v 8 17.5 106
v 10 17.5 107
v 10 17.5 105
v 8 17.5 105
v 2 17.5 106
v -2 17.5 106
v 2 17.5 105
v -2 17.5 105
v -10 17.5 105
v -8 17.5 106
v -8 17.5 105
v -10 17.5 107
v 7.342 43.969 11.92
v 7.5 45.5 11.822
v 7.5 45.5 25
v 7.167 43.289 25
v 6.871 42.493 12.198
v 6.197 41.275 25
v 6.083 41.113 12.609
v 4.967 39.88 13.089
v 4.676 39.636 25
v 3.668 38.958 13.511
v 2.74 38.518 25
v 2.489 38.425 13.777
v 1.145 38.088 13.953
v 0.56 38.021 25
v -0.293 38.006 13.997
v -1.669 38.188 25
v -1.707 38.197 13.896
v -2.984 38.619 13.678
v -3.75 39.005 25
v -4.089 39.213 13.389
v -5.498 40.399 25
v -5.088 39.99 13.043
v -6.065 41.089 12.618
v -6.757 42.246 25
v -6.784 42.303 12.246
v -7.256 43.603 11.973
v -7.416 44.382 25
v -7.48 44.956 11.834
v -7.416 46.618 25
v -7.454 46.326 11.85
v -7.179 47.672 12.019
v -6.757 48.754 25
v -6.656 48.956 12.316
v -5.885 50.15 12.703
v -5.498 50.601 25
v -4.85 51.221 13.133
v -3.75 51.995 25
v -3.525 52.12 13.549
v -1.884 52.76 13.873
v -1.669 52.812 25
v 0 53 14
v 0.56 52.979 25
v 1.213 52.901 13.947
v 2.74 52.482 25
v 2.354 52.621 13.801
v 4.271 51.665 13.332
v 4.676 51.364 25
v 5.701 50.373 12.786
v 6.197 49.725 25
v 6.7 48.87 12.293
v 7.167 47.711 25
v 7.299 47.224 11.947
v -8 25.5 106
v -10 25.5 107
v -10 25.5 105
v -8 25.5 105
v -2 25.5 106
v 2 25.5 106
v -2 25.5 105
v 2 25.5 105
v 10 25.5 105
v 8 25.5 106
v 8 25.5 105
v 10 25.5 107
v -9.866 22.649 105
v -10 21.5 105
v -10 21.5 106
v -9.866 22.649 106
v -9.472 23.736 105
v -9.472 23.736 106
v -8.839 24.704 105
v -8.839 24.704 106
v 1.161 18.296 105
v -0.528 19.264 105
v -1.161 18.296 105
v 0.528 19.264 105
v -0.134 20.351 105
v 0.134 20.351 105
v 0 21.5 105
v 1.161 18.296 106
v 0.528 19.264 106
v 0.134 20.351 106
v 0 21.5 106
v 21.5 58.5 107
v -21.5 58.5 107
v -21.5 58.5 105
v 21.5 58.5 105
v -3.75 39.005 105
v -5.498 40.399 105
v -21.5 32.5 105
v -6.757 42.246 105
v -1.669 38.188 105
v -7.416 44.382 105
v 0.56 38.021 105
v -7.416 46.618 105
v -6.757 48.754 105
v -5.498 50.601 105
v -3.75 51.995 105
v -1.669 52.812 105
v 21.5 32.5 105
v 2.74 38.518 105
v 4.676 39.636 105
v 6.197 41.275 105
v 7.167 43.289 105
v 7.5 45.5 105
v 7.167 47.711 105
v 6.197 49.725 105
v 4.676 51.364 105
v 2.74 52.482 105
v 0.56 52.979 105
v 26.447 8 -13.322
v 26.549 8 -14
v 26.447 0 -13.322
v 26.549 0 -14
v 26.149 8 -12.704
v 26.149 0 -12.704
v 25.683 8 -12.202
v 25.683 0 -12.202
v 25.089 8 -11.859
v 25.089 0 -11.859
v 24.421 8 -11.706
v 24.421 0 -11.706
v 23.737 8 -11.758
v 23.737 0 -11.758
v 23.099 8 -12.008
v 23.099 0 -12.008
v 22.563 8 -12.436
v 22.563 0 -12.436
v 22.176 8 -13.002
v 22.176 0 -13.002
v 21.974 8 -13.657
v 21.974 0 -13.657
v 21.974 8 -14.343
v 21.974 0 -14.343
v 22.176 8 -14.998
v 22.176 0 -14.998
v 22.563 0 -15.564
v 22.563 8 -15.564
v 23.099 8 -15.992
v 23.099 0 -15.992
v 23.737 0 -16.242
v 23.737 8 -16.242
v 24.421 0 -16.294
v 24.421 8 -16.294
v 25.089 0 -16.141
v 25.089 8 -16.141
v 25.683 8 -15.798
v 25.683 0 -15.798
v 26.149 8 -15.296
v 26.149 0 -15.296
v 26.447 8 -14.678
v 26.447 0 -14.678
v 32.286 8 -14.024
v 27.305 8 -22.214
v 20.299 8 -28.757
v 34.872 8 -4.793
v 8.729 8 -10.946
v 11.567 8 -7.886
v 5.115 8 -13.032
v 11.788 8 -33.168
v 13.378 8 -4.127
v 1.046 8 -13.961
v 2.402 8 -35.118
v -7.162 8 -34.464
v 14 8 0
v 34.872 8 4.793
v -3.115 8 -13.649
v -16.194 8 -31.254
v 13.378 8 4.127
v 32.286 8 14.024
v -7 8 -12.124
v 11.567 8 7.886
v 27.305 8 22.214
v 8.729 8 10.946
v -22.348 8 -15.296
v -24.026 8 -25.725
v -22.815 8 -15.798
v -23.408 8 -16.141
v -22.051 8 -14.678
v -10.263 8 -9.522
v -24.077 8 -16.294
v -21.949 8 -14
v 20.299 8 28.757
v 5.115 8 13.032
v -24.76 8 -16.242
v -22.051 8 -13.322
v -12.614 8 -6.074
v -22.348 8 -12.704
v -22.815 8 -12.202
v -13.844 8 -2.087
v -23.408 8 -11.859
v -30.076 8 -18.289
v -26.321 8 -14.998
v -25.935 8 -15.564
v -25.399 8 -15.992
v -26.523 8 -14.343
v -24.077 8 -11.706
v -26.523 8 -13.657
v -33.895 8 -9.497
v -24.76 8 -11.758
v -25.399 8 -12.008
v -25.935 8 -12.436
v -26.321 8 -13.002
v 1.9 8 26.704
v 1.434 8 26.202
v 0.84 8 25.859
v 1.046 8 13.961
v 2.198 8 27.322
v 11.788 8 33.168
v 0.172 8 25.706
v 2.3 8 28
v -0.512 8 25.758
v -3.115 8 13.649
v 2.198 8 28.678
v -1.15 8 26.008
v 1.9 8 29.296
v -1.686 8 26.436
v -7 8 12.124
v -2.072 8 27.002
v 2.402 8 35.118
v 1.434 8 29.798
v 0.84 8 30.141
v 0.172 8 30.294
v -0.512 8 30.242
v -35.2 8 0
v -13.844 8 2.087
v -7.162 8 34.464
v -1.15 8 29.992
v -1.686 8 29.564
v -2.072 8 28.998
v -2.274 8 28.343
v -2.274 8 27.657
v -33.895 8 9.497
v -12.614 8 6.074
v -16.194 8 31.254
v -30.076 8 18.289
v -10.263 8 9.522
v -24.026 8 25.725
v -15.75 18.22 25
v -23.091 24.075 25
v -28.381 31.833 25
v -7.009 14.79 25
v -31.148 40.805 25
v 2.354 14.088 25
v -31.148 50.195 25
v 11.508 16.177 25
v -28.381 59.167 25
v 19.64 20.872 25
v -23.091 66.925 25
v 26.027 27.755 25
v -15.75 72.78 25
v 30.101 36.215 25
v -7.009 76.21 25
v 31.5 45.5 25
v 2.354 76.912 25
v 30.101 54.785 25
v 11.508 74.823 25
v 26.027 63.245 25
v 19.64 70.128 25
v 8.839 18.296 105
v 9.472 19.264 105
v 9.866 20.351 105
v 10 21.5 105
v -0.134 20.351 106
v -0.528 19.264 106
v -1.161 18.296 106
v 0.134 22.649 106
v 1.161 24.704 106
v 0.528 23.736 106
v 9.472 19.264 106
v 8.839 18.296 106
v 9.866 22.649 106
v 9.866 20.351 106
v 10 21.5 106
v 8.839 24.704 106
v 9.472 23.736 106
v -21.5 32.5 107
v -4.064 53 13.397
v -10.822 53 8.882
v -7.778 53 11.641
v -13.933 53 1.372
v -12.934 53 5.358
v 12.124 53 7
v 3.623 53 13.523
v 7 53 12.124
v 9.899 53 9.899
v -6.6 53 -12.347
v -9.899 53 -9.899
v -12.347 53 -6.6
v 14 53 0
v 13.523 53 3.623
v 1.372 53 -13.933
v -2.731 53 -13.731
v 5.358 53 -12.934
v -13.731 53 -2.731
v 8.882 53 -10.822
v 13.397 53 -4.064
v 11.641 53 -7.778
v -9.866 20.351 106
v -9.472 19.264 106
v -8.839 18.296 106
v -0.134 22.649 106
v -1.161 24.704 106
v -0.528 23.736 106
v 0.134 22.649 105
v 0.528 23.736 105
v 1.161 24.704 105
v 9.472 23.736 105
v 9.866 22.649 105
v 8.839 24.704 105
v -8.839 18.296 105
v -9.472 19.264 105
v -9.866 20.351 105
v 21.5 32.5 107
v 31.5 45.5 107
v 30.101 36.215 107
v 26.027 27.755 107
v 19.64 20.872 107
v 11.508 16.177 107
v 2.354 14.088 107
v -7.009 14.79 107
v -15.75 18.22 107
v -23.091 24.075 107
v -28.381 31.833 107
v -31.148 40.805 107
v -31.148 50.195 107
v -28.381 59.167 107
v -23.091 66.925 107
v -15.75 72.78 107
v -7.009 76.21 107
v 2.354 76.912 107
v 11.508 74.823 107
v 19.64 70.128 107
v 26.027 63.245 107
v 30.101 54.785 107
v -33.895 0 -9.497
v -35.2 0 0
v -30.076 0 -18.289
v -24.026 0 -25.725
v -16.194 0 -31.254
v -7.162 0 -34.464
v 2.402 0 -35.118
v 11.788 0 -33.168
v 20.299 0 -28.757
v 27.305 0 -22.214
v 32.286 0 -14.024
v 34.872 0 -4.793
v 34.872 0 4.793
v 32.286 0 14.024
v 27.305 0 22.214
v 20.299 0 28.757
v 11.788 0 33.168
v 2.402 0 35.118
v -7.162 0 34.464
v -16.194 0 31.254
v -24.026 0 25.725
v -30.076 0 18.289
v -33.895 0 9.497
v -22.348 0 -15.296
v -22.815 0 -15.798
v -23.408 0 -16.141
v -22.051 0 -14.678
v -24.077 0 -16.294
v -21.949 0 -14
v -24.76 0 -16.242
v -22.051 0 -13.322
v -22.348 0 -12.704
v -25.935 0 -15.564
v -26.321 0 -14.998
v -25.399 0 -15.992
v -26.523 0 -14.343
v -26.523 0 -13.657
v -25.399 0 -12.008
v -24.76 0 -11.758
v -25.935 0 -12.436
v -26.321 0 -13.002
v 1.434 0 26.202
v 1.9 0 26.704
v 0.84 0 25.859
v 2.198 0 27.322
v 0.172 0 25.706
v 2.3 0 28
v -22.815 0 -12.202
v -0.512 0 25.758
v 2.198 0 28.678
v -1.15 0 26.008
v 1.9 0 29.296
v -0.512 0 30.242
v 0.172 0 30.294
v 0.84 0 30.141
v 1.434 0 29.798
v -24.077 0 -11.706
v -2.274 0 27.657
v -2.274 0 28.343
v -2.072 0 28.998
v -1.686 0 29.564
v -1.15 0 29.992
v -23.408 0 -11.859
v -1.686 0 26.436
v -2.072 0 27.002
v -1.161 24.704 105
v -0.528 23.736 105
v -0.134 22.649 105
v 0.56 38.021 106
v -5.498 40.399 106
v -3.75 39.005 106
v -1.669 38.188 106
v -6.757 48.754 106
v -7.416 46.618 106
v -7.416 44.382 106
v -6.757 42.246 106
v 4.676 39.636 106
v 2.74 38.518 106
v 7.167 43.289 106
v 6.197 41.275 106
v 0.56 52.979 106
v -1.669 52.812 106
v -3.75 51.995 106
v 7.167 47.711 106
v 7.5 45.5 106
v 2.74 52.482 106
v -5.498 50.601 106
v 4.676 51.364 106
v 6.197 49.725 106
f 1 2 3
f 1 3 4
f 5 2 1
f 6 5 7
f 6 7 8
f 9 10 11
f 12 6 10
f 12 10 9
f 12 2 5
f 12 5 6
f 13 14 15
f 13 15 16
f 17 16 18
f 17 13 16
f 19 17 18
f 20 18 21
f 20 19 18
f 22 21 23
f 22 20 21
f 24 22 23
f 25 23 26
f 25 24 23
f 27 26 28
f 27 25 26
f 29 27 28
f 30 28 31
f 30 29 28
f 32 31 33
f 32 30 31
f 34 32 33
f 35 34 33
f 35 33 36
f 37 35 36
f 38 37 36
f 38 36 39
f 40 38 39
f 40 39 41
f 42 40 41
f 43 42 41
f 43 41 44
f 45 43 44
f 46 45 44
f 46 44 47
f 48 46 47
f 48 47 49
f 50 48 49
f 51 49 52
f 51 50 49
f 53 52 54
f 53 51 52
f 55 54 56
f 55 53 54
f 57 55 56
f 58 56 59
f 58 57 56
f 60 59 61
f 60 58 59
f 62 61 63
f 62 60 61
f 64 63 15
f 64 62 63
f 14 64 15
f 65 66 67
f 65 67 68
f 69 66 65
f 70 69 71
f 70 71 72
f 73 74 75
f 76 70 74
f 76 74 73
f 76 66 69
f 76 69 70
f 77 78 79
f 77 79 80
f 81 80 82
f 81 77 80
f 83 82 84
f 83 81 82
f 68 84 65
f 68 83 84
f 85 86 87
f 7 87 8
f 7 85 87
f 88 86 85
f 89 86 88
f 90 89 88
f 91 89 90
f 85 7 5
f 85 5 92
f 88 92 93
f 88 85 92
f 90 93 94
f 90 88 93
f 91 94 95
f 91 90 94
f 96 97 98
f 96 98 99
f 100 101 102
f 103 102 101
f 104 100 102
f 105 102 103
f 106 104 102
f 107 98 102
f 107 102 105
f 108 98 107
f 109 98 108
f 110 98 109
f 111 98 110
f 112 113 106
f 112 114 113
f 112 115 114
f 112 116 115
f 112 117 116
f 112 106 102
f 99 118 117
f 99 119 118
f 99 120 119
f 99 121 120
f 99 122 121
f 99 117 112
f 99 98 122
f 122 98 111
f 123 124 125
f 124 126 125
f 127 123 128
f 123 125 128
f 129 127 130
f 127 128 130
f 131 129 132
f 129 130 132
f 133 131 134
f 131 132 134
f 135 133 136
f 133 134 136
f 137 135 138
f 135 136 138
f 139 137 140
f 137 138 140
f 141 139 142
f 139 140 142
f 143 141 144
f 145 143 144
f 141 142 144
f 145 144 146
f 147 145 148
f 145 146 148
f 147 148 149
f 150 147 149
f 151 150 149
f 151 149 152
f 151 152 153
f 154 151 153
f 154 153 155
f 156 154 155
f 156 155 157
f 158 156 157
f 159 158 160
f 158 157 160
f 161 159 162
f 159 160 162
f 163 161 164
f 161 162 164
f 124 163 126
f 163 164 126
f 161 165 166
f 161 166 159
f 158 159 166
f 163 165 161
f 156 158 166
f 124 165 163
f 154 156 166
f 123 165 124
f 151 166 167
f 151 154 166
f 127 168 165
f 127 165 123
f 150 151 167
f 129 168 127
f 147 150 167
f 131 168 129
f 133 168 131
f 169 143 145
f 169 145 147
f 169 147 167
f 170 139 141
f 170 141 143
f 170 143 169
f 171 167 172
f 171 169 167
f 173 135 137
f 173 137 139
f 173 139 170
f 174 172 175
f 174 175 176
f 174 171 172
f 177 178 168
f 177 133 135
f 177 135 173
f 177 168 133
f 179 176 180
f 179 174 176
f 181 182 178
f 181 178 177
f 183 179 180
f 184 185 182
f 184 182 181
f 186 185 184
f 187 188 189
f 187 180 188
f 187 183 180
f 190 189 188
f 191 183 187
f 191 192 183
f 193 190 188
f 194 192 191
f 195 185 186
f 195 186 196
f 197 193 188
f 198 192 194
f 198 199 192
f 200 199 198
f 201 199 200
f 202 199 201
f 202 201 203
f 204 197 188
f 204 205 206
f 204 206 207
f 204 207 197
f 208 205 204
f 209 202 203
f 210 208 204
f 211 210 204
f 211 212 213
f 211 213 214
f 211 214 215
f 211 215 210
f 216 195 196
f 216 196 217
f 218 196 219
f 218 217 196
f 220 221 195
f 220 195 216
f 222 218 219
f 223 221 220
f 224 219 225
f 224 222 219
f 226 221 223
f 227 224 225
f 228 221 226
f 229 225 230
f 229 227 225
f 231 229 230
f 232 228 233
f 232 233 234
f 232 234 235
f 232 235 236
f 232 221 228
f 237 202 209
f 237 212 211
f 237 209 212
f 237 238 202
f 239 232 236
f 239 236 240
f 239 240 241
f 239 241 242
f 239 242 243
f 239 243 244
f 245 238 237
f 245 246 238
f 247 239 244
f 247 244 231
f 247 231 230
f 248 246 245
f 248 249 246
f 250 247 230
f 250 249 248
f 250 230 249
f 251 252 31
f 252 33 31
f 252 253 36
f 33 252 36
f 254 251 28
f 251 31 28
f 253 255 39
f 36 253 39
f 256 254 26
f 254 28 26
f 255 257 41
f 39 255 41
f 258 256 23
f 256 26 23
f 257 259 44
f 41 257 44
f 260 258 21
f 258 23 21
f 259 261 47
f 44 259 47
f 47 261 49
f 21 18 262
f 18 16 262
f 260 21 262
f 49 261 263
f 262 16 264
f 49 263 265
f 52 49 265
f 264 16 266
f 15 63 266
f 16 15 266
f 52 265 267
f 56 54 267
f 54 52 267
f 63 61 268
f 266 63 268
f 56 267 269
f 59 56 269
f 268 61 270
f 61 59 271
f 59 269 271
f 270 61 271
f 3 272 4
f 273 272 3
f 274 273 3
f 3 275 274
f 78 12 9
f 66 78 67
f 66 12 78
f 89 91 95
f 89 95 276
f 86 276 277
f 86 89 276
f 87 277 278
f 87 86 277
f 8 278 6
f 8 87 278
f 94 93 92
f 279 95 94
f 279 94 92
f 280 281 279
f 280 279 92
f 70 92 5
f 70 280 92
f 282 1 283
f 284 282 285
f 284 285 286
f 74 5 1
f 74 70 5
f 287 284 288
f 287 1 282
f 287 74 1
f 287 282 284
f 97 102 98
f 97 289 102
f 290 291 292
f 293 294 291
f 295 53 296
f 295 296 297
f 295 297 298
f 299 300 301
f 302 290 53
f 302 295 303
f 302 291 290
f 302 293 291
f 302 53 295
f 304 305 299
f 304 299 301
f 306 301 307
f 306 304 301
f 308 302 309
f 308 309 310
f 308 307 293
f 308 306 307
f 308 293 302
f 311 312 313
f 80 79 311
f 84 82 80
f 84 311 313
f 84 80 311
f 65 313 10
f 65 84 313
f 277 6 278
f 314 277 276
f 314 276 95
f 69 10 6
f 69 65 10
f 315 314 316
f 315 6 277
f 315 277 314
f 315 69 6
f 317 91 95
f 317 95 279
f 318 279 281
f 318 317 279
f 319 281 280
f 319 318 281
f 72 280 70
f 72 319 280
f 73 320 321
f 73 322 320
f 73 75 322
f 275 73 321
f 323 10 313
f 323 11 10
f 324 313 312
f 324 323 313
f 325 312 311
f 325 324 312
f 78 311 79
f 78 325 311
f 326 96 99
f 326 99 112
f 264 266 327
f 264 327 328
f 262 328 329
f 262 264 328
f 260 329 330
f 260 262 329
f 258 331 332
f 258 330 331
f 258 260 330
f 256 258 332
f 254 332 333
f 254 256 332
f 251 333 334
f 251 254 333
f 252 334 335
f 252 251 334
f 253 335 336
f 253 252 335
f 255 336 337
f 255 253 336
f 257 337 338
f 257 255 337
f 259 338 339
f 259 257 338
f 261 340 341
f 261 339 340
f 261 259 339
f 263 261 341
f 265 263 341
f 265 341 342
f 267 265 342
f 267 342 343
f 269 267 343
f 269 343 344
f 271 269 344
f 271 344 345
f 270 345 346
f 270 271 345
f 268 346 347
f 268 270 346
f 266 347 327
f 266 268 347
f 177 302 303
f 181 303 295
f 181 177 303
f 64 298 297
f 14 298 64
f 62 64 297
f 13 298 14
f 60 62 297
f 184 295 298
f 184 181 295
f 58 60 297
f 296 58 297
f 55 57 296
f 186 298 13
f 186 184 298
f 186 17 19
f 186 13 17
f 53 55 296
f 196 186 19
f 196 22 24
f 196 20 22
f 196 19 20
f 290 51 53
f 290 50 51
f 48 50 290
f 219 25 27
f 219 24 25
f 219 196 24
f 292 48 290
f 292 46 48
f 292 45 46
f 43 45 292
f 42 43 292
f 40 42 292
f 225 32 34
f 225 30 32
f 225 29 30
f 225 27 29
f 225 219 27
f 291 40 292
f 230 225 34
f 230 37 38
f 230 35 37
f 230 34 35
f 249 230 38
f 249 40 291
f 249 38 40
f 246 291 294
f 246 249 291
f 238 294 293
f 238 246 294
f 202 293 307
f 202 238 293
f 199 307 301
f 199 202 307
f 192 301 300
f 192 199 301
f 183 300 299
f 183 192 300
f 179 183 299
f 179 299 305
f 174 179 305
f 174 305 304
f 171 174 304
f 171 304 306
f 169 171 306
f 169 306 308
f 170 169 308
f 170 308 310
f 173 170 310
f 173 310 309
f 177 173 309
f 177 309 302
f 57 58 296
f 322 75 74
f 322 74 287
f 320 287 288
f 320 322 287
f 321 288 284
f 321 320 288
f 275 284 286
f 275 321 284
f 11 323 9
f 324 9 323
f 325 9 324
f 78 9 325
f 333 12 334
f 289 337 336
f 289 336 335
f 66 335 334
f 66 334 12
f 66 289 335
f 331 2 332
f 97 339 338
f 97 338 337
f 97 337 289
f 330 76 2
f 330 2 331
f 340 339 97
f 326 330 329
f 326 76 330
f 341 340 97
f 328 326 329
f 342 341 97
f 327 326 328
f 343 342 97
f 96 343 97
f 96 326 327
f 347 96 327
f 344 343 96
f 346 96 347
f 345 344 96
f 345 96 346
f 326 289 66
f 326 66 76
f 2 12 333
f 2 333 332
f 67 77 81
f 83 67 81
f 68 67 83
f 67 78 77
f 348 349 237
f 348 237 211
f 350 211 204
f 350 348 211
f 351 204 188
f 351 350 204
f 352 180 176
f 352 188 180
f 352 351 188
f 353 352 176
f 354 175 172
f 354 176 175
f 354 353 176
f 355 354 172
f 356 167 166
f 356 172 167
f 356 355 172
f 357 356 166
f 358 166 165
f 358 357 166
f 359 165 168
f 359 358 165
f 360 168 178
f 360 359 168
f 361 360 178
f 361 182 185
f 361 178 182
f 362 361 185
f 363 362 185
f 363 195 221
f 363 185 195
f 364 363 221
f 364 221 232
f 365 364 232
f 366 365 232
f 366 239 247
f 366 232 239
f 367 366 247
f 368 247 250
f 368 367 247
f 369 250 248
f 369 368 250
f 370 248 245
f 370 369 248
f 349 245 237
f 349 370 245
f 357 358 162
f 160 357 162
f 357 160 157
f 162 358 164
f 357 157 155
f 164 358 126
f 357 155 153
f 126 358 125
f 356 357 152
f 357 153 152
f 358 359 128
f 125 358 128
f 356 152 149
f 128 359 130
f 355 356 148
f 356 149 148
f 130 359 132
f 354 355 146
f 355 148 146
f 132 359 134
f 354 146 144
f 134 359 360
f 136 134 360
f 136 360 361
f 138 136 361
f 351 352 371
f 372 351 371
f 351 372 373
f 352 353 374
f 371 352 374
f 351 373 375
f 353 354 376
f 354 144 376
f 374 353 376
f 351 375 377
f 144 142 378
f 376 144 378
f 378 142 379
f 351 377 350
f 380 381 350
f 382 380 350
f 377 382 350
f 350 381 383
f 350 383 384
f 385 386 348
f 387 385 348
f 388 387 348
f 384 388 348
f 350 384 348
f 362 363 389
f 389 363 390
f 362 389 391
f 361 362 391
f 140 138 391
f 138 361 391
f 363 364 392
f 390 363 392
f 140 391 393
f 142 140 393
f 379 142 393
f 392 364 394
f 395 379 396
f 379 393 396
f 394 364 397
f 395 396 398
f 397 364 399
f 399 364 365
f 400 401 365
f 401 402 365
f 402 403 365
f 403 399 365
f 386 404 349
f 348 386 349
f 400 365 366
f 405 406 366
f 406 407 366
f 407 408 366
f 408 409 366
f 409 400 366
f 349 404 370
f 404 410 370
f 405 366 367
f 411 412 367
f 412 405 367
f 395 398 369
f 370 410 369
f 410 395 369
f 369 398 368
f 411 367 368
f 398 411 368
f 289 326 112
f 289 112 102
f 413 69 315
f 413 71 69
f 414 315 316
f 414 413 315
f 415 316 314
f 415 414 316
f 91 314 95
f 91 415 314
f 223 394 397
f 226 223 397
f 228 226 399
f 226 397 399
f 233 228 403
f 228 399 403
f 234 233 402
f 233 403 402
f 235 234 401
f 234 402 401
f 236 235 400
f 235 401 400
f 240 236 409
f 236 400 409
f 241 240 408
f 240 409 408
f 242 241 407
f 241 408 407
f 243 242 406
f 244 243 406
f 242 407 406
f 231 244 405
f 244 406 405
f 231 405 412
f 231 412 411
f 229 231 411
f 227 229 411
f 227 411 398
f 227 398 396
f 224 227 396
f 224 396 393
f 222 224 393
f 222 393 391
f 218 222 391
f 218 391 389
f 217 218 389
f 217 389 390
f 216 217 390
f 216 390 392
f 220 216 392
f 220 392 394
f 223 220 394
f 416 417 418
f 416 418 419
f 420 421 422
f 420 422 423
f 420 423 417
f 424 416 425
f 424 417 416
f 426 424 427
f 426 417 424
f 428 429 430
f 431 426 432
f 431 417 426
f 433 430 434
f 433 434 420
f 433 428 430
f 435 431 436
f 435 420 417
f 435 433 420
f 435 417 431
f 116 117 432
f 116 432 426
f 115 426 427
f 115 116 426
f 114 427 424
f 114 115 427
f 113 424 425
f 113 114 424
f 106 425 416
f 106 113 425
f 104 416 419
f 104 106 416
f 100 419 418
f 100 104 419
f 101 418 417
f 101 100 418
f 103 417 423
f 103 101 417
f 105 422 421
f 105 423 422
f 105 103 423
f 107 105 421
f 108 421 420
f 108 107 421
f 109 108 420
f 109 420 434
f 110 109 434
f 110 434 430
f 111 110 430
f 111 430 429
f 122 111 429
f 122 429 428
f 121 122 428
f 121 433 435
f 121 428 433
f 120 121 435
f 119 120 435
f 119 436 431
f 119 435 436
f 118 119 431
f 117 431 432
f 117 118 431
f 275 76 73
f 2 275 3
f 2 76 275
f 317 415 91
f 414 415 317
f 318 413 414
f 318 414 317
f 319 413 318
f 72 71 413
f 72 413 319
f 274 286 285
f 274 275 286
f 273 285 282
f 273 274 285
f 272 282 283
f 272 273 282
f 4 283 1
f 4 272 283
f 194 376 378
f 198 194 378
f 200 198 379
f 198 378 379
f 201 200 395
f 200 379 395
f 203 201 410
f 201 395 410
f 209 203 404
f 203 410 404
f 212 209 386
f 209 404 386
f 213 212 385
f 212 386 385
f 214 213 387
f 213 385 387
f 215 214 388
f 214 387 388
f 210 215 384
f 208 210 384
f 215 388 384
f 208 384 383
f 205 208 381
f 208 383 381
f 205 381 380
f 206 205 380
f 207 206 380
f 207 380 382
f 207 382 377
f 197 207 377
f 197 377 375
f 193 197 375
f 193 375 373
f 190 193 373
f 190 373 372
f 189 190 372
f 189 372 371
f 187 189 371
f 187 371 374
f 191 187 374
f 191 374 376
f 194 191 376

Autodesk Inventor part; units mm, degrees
ref_plane "YZ Plane" through (0, 0, 0) normal (1, 0, 0) x (0, 1, 0)
ref_plane "XZ Plane" through (0, 0, 0) normal (0, 1, 0) x (-1, 0, 0)
ref_plane "XY Plane" through (0, 0, 0) normal (0, 0, 1) x (1, 0, 0)
sketch "Sketch1" plane through (0, 0, 0) normal (0, 1, 0) x (-1, 0, 0)
  circle A0 centre (0, 0) radius 35.2
  dimension "d0" = 70.4
extrude "Extrusion1" add sketch "Sketch1" along normal blind 8
sketch "Sketch2" plane through (0, 8, 0) normal (0, 1, 0) x (1, 0, 0)
  circle A0 centre (0, 0) radius 14
  dimension "d3" = 28
extrude "Extrusion2" add sketch "Sketch2" along normal blind 45
sketch "Sketch3" plane through (0, 0, 0) normal (0, 0, 1) x (1, 0, 0)
  circle A0 centre (0, 45.5) radius 7.5
  point P0 (0, 0)
extrude "Extrusion3" add sketch "Sketch3" along normal blind 25
sketch "Sketch4" plane through (0, 45.5, 25) normal (0, 0, 1) x (1, 0, 0)
  circle A0 centre (0, 0) radius 31.5
  point P0 (0, -45.5)
  dimension "d8" = 63
extrude "Extrusion4" add sketch "Sketch4" along normal blind 82
sketch "Sketch5" plane through (0, 45.5, 107) normal (0, 0, 1) x (1, 0, 0)
  line L0 (-21.5, 13) -> (21.5, 13)
  line L1 (21.5, 13) -> (21.5, -13)
  line L2 (21.5, -13) -> (-21.5, -13)
  line L3 (-21.5, -13) -> (-21.5, 13)
  line L4 (-21.5, 13) -> (21.5, -13) construction
  line L5 (21.5, 13) -> (-21.5, -13) construction
  line L6 (-10, -20) -> (10, -20)
  line L7 (10, -20) -> (10, -28)
  line L8 (10, -28) -> (-10, -28)
  line L9 (-10, -28) -> (-10, -20)
  line L10 (-10, -20) -> (10, -28) construction
  line L11 (10, -20) -> (-10, -28) construction
  point P0 (0, -45.5)
  point P1 (0, 0)
  point P2 (0, -24)
  dimension "d11" = 43
  dimension "d12" = 26
  dimension "d13" = 20
  dimension "d14" = 8
extrude "Extrusion5" cut sketch "Sketch5" against normal blind 2
sketch "Sketch6" plane through (0, 45.5, 105) normal (0, 0, 1) x (1, 0, 0)
  circle A0 centre (0, 0) radius 7.5
  circle A1 centre (-5, -24) radius 5
  circle A2 centre (5, -24) radius 5
  point P0 (0, -45.5)
  point P1 (0, -24)
  dimension "d17" = 15
  dimension "d18" = 10
  dimension "d19" = 10
extrude "Extrusion6" add sketch "Sketch6" along normal blind 1
sketch "Sketch8" plane through (0, 0, 0) normal (0, -1, 0) x (1, 0, 0)
  circle A0 centre (0, 0) radius 28 construction
  line L0 (0, 0) -> (50, 0) construction
  line L1 (0, 0) -> (-43.3013, -25) construction
  line L2 (0, 0) -> (50, 0) construction
  line L3 (0, 0) -> (0, 50)
  line L4 (0, 0) -> (50, 0) construction
  circle A1 centre (0, 28) radius 2.3
  circle A2 centre (-24.2487, -14) radius 2.3
  line L5 (0, 0) -> (43.3013, -25) construction
  line L6 (0, 0) -> (50, 0) construction
  circle A3 centre (24.2487, -14) radius 2.3
  dimension "d22" = 56
  dimension "d26" = 50
  dimension "d27" = 210
  dimension "d28" = 50
  dimension "d29" = 90
  dimension "d30" = 4.6
  dimension "d31" = 4.6
  dimension "d34" = 50
  dimension "d35" = 30
  dimension "d36" = 4.6
extrude "Extrusion7" cut sketch "Sketch8" against normal blind 8
properties part number "camera real"
